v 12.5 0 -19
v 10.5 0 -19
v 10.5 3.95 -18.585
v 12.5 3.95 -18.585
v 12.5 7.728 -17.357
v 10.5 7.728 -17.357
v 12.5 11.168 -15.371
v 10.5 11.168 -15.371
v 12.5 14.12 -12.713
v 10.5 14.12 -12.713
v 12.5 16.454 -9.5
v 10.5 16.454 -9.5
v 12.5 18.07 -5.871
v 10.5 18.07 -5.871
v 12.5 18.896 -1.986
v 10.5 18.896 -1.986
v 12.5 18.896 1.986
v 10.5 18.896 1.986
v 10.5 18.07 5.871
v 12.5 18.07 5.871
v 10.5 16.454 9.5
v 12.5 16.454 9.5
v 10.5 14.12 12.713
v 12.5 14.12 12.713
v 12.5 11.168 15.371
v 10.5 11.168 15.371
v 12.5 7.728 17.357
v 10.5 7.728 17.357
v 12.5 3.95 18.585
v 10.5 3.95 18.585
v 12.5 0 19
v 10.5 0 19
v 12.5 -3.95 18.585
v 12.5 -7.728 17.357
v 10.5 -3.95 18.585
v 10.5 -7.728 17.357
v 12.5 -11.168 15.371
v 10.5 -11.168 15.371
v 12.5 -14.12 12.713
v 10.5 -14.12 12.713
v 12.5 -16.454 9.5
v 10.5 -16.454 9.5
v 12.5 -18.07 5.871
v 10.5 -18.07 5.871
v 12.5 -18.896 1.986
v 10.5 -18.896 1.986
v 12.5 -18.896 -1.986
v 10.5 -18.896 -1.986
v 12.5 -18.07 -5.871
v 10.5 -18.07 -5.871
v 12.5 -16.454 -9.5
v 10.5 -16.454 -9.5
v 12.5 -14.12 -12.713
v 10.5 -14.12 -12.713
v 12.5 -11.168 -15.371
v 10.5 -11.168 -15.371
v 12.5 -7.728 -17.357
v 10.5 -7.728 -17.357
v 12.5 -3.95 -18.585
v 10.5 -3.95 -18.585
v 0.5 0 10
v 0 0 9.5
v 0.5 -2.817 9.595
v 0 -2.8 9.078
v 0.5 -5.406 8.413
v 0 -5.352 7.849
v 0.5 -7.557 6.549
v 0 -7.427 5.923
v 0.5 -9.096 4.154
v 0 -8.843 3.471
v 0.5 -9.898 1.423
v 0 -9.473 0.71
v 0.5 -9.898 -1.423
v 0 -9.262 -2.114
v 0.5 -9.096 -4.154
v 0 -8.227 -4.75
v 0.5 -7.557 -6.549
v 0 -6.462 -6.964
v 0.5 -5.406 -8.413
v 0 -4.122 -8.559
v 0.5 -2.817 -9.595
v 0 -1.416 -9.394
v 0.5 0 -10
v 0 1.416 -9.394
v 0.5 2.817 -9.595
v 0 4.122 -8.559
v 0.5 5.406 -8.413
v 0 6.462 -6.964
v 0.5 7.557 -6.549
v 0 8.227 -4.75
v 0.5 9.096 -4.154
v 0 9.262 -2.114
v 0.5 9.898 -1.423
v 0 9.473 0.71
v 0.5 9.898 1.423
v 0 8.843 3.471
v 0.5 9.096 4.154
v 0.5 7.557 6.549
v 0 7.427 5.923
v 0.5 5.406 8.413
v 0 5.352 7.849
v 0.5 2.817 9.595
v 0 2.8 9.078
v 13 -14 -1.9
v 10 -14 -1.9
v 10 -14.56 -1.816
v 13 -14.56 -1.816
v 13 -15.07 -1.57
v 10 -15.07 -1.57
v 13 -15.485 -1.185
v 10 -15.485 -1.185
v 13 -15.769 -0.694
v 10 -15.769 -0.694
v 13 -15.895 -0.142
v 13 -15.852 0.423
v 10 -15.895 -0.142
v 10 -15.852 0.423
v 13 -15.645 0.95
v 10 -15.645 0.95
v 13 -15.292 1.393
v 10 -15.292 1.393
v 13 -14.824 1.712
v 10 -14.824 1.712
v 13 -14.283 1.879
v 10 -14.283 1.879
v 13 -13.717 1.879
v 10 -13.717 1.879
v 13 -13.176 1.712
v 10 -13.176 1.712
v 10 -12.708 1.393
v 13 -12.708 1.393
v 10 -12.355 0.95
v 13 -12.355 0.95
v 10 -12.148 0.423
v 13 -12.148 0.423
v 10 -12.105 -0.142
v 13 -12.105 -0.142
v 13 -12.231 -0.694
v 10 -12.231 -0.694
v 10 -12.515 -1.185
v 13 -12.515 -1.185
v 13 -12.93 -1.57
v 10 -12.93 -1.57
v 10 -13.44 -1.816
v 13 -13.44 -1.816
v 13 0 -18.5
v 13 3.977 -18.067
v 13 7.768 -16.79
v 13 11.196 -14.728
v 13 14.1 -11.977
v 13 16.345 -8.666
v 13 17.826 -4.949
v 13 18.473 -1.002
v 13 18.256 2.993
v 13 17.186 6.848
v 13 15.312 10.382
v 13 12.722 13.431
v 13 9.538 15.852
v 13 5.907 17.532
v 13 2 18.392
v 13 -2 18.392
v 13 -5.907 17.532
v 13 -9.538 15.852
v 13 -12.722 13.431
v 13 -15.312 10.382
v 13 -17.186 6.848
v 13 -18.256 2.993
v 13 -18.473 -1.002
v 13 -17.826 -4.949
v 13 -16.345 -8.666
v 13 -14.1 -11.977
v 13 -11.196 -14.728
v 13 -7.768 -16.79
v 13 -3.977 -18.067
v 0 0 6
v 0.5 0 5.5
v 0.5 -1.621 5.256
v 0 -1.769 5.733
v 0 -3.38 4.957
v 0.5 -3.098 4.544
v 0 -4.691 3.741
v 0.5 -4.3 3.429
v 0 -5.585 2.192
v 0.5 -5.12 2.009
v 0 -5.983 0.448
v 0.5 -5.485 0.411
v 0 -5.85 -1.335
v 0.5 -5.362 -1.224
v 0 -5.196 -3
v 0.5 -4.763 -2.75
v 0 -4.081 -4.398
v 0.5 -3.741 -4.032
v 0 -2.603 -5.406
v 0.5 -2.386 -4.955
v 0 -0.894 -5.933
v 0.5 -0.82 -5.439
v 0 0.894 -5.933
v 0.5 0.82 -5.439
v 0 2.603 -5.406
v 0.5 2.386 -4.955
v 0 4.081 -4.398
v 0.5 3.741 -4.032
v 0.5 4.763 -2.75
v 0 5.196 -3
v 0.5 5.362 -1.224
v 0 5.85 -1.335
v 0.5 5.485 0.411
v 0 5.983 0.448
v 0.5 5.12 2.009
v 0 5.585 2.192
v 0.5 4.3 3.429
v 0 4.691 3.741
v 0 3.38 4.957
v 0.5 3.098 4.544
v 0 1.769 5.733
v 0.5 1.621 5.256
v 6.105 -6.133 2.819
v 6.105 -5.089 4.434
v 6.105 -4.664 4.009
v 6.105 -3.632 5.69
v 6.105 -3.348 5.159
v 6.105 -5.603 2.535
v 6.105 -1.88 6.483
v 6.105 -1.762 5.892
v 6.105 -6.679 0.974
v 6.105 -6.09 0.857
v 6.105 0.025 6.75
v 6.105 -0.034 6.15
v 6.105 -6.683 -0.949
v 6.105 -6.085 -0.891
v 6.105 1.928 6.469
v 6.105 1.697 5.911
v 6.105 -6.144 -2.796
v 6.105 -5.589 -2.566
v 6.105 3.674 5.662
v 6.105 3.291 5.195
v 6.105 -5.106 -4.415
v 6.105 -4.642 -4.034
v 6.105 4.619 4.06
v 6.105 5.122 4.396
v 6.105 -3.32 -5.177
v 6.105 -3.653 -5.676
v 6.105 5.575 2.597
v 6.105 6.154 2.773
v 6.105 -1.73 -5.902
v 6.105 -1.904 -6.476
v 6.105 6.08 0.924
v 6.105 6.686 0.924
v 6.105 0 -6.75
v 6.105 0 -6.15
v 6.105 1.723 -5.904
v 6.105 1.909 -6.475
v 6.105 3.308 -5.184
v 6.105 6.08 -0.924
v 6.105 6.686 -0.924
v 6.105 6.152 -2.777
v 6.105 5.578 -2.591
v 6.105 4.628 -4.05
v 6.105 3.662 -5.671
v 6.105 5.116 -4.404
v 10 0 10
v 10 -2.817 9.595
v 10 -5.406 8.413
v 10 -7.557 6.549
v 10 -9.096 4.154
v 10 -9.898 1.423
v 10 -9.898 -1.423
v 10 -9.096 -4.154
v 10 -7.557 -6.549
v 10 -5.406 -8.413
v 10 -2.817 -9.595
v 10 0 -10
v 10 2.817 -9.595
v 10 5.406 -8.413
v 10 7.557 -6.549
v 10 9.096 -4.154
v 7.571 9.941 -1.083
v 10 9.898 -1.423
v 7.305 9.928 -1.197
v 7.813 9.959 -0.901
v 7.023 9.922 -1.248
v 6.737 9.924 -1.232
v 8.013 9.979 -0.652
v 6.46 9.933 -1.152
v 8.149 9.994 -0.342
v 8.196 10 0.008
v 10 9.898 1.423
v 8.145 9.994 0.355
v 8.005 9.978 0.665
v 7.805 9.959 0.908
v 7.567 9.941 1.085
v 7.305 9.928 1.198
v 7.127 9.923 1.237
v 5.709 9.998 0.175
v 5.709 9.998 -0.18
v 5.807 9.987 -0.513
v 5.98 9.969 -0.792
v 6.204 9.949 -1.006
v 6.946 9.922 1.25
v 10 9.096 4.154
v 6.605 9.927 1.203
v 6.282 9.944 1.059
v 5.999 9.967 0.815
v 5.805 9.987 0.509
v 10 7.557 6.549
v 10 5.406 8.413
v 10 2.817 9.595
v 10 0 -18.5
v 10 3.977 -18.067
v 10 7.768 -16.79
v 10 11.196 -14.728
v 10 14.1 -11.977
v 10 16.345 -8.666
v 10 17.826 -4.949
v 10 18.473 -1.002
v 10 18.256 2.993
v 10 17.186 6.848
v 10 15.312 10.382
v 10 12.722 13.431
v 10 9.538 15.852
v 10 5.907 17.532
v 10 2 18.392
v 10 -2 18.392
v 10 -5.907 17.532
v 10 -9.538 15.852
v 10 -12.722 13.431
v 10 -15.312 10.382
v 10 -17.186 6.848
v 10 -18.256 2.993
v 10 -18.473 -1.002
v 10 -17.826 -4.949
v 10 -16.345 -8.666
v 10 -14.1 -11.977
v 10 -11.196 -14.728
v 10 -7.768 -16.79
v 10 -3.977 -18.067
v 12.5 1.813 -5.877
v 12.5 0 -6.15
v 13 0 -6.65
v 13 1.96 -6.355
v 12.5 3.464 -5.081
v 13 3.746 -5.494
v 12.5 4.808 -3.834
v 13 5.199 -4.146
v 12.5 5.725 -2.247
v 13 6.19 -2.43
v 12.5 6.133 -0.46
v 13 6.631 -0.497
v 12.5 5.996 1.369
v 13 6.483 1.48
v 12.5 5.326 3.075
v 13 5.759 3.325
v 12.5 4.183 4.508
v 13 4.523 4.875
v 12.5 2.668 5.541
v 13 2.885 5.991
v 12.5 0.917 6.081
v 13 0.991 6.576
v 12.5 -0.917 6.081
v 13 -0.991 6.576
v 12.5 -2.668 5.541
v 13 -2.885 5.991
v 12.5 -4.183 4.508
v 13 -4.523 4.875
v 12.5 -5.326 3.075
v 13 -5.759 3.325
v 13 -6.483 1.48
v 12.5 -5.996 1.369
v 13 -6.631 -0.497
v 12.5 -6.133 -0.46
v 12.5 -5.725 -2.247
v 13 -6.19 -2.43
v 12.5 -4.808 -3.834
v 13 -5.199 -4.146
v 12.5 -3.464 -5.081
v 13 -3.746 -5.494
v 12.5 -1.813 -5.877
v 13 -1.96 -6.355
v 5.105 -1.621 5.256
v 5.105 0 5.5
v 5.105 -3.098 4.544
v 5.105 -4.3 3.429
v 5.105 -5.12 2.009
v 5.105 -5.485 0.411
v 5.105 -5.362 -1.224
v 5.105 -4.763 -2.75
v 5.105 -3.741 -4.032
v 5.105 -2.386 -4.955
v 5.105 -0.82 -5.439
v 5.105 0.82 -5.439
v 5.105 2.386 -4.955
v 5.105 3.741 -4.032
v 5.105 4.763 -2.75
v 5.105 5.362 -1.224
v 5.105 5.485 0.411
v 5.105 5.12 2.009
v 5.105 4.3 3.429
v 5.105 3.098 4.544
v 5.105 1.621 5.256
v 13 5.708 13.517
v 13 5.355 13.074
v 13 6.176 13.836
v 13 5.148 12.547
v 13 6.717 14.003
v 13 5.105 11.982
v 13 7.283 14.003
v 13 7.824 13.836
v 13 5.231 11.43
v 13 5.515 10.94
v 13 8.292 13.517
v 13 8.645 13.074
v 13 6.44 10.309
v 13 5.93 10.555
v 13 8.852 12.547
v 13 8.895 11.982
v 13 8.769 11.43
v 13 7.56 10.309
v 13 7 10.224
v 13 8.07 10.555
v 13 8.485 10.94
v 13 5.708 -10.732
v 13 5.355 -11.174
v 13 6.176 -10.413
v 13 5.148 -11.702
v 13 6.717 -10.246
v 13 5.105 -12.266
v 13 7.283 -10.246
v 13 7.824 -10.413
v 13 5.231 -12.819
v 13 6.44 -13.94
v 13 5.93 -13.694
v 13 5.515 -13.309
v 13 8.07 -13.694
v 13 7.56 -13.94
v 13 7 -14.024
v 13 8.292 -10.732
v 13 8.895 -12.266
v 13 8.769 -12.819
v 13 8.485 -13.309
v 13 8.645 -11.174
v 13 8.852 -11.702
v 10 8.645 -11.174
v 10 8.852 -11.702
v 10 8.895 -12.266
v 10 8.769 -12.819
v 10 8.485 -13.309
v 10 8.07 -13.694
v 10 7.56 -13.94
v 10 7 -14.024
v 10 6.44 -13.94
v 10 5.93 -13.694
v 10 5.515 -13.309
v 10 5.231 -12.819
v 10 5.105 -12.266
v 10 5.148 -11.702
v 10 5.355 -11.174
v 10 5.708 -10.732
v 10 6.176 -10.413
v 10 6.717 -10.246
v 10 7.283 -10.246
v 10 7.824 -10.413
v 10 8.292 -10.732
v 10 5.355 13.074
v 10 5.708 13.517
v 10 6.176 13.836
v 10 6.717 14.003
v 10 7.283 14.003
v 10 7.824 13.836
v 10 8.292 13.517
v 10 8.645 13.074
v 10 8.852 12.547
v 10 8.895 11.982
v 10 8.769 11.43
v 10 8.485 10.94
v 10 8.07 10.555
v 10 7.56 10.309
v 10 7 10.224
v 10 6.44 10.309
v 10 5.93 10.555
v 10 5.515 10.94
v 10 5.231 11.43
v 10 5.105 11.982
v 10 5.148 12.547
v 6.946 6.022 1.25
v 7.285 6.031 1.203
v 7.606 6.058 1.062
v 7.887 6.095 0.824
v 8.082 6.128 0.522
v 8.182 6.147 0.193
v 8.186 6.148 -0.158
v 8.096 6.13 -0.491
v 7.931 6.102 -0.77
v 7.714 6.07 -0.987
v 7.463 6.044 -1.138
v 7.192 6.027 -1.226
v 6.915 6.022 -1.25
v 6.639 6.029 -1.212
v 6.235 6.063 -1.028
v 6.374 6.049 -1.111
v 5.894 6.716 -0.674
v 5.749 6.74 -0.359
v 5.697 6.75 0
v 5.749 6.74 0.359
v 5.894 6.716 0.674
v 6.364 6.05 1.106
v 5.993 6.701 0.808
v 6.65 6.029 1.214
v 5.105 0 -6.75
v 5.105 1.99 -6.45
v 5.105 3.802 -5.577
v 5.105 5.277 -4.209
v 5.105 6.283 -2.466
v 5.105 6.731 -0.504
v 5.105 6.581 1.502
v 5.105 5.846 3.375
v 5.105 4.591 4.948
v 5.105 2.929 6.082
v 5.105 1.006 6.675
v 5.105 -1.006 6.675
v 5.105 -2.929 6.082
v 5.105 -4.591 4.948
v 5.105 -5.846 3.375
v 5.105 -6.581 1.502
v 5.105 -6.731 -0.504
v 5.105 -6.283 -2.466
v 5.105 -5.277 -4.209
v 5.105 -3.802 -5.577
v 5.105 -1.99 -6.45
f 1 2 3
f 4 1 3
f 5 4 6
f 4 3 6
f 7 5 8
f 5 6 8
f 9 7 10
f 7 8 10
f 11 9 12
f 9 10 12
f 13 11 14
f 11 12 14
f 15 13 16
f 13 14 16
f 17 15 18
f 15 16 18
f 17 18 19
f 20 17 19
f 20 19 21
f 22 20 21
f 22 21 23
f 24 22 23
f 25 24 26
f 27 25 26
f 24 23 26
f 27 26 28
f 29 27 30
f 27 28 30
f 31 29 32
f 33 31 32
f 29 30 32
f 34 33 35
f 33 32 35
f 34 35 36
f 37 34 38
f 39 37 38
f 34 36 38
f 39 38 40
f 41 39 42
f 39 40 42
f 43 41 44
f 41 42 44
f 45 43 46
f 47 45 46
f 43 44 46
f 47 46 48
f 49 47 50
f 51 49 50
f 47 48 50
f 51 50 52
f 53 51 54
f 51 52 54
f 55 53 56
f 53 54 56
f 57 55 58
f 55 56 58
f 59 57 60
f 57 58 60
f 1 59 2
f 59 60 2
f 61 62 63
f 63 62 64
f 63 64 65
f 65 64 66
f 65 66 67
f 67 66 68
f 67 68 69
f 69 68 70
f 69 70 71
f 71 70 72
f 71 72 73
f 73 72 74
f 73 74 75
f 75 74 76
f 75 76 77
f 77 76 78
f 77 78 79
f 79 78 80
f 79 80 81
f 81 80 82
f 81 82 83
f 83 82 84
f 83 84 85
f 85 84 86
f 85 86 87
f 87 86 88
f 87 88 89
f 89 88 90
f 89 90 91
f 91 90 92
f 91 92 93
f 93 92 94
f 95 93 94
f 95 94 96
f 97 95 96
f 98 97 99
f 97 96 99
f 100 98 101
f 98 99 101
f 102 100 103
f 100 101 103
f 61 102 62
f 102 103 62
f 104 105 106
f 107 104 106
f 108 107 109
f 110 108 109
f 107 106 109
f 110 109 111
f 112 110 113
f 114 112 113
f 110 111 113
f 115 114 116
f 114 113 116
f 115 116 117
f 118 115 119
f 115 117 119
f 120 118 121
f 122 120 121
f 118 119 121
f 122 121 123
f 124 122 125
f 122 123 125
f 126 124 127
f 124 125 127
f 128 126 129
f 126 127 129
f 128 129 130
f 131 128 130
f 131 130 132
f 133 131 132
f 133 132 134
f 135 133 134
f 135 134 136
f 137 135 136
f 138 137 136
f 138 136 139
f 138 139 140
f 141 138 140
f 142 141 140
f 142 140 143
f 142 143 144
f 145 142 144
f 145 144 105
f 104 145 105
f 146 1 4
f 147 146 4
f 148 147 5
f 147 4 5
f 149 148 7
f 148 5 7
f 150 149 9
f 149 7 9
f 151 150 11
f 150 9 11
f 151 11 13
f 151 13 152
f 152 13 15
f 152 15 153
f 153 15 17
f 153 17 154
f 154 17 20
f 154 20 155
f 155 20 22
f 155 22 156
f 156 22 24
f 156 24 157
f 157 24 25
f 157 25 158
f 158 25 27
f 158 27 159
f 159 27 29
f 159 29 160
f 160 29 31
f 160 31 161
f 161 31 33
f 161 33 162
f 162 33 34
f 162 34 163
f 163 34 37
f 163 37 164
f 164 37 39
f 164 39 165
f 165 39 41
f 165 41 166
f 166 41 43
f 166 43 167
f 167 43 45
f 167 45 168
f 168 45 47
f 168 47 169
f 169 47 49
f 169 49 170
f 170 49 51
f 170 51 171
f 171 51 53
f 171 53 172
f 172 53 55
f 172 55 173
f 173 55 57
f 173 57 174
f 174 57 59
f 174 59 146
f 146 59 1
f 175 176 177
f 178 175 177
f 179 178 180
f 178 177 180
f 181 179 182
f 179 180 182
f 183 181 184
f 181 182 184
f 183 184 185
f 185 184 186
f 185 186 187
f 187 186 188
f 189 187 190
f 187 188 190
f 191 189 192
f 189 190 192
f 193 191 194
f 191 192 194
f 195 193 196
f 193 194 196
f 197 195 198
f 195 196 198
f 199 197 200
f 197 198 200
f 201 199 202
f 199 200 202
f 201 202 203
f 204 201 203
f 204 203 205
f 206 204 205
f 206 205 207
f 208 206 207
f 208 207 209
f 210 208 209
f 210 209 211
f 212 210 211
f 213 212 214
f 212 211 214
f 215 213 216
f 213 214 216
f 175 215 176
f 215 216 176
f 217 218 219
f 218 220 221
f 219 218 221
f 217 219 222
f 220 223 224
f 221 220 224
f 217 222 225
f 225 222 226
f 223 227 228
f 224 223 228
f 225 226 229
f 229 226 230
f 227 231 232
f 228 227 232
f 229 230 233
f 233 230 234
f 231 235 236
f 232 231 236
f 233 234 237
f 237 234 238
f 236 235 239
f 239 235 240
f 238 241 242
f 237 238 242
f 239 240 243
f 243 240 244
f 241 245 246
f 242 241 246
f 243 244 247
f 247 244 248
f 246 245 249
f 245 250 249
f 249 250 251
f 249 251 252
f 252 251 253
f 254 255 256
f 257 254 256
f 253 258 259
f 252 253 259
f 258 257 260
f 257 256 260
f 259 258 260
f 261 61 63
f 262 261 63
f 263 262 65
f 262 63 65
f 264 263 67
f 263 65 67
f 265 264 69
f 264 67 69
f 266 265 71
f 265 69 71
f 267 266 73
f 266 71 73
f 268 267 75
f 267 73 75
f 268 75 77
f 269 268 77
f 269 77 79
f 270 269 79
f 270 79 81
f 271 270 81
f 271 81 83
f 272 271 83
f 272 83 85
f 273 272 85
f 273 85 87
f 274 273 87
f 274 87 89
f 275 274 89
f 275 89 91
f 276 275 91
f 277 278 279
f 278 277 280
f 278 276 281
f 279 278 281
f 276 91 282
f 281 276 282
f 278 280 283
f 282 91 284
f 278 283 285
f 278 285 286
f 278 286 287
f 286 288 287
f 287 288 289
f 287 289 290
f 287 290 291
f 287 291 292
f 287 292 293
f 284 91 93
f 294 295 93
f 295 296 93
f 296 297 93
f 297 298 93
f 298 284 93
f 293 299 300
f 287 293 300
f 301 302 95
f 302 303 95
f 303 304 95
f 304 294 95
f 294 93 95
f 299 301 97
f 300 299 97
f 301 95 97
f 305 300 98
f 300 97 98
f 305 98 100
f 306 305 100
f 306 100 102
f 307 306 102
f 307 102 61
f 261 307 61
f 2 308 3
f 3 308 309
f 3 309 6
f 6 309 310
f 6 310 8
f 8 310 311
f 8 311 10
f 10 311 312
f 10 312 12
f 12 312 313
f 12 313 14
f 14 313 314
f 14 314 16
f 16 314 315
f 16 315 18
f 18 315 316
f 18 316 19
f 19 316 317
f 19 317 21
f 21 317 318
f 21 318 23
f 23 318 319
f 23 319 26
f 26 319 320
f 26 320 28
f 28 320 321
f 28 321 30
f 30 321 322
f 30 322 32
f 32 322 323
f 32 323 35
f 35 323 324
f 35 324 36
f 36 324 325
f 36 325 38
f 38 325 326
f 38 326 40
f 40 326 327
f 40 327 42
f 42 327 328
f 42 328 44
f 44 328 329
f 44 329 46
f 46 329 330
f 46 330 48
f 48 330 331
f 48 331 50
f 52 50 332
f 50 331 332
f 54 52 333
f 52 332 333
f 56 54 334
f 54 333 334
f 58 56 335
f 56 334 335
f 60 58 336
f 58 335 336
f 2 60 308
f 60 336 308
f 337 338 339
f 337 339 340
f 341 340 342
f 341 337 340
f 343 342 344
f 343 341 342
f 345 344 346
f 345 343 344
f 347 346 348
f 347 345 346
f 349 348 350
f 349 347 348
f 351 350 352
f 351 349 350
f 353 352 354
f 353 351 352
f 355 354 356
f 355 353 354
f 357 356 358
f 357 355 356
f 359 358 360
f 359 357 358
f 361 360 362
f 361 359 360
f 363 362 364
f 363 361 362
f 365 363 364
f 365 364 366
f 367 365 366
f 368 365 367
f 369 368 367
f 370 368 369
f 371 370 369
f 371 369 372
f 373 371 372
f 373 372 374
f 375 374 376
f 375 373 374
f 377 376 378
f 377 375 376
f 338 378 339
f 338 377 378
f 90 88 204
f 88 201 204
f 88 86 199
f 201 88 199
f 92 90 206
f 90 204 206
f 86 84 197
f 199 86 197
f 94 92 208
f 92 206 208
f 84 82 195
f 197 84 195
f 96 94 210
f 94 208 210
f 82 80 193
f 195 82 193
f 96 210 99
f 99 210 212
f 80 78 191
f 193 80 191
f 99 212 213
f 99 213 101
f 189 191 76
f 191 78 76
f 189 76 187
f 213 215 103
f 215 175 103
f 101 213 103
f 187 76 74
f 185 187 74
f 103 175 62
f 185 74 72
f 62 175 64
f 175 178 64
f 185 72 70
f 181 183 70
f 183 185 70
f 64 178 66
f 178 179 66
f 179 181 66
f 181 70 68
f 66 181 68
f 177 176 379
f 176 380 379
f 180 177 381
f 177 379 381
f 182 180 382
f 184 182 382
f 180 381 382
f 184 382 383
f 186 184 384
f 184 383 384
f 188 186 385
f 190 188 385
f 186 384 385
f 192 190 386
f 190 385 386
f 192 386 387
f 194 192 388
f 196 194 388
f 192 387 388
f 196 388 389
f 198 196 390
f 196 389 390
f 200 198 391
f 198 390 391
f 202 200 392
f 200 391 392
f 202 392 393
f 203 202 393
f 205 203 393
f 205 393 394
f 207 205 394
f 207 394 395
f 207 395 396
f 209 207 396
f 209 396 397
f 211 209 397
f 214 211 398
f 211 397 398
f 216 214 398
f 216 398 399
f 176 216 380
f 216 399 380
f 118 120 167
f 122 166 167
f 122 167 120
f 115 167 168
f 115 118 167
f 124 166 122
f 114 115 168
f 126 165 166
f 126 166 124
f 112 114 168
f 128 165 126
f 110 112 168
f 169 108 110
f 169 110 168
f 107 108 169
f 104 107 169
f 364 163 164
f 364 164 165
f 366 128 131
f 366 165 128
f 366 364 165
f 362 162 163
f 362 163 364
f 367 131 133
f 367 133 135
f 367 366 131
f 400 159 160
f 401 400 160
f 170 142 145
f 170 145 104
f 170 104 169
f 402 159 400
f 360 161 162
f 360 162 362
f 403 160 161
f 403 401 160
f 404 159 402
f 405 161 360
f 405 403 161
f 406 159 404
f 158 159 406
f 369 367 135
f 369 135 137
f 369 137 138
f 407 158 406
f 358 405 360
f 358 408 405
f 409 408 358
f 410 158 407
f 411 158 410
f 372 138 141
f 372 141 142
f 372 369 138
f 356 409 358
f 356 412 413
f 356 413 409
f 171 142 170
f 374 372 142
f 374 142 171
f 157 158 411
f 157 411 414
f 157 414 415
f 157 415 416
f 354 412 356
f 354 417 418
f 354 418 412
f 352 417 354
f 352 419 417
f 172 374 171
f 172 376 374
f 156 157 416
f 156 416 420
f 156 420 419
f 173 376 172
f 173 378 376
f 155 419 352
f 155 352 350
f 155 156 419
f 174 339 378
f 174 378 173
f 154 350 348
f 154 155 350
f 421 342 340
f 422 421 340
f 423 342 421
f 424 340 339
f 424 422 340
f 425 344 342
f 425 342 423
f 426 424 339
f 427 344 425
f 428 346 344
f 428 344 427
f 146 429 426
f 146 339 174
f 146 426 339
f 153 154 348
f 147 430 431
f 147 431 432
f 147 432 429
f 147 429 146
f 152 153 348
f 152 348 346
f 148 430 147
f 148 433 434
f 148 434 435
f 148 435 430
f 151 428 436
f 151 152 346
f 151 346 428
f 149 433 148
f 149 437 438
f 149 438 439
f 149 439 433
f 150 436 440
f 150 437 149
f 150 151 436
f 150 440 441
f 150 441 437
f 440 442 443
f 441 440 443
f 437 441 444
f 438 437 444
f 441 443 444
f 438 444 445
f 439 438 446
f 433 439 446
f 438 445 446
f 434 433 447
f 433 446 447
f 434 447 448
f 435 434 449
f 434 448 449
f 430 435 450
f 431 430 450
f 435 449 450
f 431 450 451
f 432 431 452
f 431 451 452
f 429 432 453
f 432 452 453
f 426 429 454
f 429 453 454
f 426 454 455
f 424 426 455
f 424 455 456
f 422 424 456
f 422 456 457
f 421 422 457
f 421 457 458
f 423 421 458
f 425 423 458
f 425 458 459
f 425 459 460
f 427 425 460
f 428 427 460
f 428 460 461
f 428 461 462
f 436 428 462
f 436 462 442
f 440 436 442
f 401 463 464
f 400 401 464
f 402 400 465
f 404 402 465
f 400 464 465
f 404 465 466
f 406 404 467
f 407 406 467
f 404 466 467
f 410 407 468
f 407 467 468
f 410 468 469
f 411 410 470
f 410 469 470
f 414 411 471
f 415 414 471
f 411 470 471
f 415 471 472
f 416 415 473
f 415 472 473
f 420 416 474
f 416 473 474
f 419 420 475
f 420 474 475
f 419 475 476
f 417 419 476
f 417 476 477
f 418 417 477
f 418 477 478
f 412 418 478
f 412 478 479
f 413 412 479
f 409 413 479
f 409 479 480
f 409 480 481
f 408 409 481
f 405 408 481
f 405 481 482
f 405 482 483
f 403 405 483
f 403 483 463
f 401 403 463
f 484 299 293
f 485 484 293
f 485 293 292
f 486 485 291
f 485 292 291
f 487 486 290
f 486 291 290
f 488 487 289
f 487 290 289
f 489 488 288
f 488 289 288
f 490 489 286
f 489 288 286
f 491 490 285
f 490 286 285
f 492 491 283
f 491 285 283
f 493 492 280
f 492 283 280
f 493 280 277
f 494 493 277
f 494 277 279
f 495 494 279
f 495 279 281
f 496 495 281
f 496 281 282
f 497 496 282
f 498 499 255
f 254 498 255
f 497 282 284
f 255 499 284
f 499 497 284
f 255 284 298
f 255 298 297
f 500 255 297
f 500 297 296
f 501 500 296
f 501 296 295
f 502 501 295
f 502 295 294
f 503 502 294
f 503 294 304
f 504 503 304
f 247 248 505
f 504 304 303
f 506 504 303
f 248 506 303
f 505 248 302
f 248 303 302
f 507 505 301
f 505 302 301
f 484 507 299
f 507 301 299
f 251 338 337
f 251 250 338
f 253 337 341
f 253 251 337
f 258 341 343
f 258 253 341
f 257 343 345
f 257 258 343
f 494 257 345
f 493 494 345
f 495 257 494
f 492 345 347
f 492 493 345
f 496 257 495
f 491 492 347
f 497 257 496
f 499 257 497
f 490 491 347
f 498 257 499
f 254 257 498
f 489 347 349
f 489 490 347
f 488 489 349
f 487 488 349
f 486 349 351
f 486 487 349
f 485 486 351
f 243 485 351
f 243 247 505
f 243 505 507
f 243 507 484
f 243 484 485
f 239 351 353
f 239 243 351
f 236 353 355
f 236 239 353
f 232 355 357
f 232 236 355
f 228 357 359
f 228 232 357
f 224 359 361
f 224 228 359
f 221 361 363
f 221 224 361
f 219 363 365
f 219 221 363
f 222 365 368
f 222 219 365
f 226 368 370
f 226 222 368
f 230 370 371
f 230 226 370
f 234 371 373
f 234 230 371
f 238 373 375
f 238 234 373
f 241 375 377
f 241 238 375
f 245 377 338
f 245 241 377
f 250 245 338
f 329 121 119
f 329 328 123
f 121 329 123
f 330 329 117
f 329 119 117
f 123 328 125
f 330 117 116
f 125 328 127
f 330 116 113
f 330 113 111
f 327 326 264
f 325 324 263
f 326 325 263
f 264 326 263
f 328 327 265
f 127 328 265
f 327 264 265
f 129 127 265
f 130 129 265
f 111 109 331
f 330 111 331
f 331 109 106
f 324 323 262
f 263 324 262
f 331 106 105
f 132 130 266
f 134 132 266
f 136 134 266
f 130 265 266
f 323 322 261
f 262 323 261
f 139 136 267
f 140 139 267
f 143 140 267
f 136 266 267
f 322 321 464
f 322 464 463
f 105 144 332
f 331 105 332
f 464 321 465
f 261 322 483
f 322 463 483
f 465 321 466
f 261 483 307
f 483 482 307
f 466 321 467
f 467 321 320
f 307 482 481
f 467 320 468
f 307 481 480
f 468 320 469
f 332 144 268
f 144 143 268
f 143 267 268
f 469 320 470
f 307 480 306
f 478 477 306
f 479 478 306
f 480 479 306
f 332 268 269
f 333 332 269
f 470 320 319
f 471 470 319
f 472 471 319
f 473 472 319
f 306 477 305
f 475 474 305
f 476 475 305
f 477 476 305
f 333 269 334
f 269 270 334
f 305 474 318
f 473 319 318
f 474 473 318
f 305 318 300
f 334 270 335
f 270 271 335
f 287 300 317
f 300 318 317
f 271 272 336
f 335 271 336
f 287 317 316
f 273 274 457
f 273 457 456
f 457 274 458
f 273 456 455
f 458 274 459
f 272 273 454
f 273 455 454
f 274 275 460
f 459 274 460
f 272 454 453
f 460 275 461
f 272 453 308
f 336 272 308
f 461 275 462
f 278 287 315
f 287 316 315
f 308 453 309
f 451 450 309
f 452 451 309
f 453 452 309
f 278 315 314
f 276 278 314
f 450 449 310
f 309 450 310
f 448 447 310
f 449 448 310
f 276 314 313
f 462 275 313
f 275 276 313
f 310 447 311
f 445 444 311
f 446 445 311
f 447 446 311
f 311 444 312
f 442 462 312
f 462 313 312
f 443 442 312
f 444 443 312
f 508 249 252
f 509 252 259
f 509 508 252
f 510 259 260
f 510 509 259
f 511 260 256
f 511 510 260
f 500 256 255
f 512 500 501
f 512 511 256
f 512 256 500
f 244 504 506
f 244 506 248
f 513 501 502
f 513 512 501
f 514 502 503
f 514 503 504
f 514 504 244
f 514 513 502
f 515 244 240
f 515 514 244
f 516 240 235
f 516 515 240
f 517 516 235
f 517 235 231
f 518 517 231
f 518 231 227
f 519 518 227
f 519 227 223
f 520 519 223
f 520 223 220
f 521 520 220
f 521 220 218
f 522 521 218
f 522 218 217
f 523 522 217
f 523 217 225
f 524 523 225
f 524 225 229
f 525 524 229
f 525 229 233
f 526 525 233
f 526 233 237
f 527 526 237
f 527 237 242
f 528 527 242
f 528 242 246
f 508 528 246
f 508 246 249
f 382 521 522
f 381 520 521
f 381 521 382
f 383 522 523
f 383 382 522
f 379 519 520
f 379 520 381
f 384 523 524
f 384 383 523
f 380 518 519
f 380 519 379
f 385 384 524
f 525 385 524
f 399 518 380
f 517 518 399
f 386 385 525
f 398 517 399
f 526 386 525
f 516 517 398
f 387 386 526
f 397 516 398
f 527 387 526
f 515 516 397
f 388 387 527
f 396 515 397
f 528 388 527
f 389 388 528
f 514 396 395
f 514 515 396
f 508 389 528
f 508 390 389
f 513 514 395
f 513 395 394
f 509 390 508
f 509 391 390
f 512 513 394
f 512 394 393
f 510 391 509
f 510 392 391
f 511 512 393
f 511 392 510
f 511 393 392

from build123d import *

# Parameters (mm, degrees)
SKETCH2_R                       = 10
BOSS_EXTRUDE1_DEPTH             = 13
F_11_0_11_M12X0_5_TAPPED_HOLE_D = 11
CHAMFER1_SIZE                   = 0.5
CUT_EXTRUDE8_START              = -7.895
SKETCH4_R                       = 6.15
CUT_EXTRUDE8_DEPTH              = 7.895
SKETCH5_R                       = 6.75
CUT_EXTRUDE9_DEPTH              = 1
SKETCH6_R                       = 19
SKETCH6_R_2                     = 6.15
BOSS_EXTRUDE2_DEPTH             = 3
CHAMFER2_SIZE                   = 0.5
M3_TAPPED_HOLE1_REACH           = 37.359
M3_TAPPED_HOLE1_BORE_R          = 1.25
F_3_8_3_8_DIAMETER_HOLE1_D      = 3.8
CIRPATTERN1_COUNT               = 3
CHAMFER4_SIZE                   = 0.5


with BuildPart() as part:
    # Sketch2 → Boss-Extrude1 (new body)
    with BuildSketch(Plane(origin=(0, 0, 0), x_dir=(0, 0, -1), z_dir=(1, 0, 0))):
        with Locations(Location((0, 0, 0), (0, 0, 180))):
            Circle(SKETCH2_R)
    extrude(amount=BOSS_EXTRUDE1_DEPTH)

    # Ø11.0 (11) M12x0.5 tapped hole (through all)
    with Locations(Plane(origin=(0, 0, 0), x_dir=(0, 0, -1), z_dir=(-1, 0, 0))):
        with Locations((0, 0)):
            Hole(F_11_0_11_M12X0_5_TAPPED_HOLE_D / 2)

    # Chamfer1
    chamfer1_edges = [part.edges().sort_by_distance(p)[0] for p in [
        (0, 0, -5.5),
    ]]
    chamfer(chamfer1_edges, length=CHAMFER1_SIZE)

    # Sketch4 → Cut-Extrude8 (cut)
    with BuildSketch(Plane(origin=(13, 0, 0), x_dir=(0, 0, -1), z_dir=(1, 0, 0)).offset(CUT_EXTRUDE8_START)):
        Circle(SKETCH4_R)
    extrude(amount=CUT_EXTRUDE8_DEPTH, mode=Mode.SUBTRACT)

    # Sketch5 → Cut-Extrude9 (cut)
    with BuildSketch(Plane(origin=(5.105, 0, 0), x_dir=(0, 0, -1), z_dir=(1, 0, 0))):
        Circle(SKETCH5_R)
    extrude(amount=CUT_EXTRUDE9_DEPTH, mode=Mode.SUBTRACT)

    # Sketch6 → Boss-Extrude2 (add)
    with BuildSketch(Plane(origin=(10, 0, 0), x_dir=(0, 0, -1), z_dir=(1, 0, 0))):
        Circle(SKETCH6_R)
        Circle(SKETCH6_R_2, mode=Mode.SUBTRACT)
    extrude(amount=BOSS_EXTRUDE2_DEPTH)

    # Chamfer2
    chamfer2_edges = [part.edges().sort_by_distance(p)[0] for p in [
        (13, 0, 6.15),
    ]]
    chamfer(chamfer2_edges, length=CHAMFER2_SIZE)

    # M3 Tapped Hole1 bore (on position points) → M3 Tapped Hole1 (cut, up to next)
    with BuildSketch(Plane(origin=(6.9465, 10, 0), x_dir=(0, 0, 1), z_dir=(0, 1, 0)), mode=Mode.PRIVATE) as m3_tapped_hole1_sk1:
        Circle(M3_TAPPED_HOLE1_BORE_R)
    m3_tapped_hole1_tool1 = extrude(m3_tapped_hole1_sk1.sketch, amount=-M3_TAPPED_HOLE1_REACH, mode=Mode.PRIVATE) & part.part
    add(m3_tapped_hole1_tool1.solids().sort_by_distance((6.9465, 10, 0))[0], mode=Mode.SUBTRACT)

    # Ø3.8 (3.8) Diameter Hole1 (through all)
    with Locations(Plane(origin=(13, -14, 0), x_dir=(0, 0, 1), z_dir=(1, 0, 0))):
        with Locations((0, 0)):
            f_3_8_3_8_diameter_hole1 = Hole(F_3_8_3_8_DIAMETER_HOLE1_D / 2)

    # CirPattern1: Ø3.8 (3.8) Diameter Hole1 ×3 about axis
    cirpattern1_axis = Axis((0, 0, 0), (1, 0, 0))
    for i in range(1, CIRPATTERN1_COUNT):
        add(f_3_8_3_8_diameter_hole1.rotate(cirpattern1_axis, i * 360 / CIRPATTERN1_COUNT), mode=Mode.SUBTRACT)

    # Chamfer4
    chamfer4_edges = [part.edges().sort_by_distance(p)[0] for p in [
        (0, 0, -10),
        (13, 0, 19),
        (10, 0, 19),
    ]]
    chamfer(chamfer4_edges, length=CHAMFER4_SIZE)


solid = part.part
